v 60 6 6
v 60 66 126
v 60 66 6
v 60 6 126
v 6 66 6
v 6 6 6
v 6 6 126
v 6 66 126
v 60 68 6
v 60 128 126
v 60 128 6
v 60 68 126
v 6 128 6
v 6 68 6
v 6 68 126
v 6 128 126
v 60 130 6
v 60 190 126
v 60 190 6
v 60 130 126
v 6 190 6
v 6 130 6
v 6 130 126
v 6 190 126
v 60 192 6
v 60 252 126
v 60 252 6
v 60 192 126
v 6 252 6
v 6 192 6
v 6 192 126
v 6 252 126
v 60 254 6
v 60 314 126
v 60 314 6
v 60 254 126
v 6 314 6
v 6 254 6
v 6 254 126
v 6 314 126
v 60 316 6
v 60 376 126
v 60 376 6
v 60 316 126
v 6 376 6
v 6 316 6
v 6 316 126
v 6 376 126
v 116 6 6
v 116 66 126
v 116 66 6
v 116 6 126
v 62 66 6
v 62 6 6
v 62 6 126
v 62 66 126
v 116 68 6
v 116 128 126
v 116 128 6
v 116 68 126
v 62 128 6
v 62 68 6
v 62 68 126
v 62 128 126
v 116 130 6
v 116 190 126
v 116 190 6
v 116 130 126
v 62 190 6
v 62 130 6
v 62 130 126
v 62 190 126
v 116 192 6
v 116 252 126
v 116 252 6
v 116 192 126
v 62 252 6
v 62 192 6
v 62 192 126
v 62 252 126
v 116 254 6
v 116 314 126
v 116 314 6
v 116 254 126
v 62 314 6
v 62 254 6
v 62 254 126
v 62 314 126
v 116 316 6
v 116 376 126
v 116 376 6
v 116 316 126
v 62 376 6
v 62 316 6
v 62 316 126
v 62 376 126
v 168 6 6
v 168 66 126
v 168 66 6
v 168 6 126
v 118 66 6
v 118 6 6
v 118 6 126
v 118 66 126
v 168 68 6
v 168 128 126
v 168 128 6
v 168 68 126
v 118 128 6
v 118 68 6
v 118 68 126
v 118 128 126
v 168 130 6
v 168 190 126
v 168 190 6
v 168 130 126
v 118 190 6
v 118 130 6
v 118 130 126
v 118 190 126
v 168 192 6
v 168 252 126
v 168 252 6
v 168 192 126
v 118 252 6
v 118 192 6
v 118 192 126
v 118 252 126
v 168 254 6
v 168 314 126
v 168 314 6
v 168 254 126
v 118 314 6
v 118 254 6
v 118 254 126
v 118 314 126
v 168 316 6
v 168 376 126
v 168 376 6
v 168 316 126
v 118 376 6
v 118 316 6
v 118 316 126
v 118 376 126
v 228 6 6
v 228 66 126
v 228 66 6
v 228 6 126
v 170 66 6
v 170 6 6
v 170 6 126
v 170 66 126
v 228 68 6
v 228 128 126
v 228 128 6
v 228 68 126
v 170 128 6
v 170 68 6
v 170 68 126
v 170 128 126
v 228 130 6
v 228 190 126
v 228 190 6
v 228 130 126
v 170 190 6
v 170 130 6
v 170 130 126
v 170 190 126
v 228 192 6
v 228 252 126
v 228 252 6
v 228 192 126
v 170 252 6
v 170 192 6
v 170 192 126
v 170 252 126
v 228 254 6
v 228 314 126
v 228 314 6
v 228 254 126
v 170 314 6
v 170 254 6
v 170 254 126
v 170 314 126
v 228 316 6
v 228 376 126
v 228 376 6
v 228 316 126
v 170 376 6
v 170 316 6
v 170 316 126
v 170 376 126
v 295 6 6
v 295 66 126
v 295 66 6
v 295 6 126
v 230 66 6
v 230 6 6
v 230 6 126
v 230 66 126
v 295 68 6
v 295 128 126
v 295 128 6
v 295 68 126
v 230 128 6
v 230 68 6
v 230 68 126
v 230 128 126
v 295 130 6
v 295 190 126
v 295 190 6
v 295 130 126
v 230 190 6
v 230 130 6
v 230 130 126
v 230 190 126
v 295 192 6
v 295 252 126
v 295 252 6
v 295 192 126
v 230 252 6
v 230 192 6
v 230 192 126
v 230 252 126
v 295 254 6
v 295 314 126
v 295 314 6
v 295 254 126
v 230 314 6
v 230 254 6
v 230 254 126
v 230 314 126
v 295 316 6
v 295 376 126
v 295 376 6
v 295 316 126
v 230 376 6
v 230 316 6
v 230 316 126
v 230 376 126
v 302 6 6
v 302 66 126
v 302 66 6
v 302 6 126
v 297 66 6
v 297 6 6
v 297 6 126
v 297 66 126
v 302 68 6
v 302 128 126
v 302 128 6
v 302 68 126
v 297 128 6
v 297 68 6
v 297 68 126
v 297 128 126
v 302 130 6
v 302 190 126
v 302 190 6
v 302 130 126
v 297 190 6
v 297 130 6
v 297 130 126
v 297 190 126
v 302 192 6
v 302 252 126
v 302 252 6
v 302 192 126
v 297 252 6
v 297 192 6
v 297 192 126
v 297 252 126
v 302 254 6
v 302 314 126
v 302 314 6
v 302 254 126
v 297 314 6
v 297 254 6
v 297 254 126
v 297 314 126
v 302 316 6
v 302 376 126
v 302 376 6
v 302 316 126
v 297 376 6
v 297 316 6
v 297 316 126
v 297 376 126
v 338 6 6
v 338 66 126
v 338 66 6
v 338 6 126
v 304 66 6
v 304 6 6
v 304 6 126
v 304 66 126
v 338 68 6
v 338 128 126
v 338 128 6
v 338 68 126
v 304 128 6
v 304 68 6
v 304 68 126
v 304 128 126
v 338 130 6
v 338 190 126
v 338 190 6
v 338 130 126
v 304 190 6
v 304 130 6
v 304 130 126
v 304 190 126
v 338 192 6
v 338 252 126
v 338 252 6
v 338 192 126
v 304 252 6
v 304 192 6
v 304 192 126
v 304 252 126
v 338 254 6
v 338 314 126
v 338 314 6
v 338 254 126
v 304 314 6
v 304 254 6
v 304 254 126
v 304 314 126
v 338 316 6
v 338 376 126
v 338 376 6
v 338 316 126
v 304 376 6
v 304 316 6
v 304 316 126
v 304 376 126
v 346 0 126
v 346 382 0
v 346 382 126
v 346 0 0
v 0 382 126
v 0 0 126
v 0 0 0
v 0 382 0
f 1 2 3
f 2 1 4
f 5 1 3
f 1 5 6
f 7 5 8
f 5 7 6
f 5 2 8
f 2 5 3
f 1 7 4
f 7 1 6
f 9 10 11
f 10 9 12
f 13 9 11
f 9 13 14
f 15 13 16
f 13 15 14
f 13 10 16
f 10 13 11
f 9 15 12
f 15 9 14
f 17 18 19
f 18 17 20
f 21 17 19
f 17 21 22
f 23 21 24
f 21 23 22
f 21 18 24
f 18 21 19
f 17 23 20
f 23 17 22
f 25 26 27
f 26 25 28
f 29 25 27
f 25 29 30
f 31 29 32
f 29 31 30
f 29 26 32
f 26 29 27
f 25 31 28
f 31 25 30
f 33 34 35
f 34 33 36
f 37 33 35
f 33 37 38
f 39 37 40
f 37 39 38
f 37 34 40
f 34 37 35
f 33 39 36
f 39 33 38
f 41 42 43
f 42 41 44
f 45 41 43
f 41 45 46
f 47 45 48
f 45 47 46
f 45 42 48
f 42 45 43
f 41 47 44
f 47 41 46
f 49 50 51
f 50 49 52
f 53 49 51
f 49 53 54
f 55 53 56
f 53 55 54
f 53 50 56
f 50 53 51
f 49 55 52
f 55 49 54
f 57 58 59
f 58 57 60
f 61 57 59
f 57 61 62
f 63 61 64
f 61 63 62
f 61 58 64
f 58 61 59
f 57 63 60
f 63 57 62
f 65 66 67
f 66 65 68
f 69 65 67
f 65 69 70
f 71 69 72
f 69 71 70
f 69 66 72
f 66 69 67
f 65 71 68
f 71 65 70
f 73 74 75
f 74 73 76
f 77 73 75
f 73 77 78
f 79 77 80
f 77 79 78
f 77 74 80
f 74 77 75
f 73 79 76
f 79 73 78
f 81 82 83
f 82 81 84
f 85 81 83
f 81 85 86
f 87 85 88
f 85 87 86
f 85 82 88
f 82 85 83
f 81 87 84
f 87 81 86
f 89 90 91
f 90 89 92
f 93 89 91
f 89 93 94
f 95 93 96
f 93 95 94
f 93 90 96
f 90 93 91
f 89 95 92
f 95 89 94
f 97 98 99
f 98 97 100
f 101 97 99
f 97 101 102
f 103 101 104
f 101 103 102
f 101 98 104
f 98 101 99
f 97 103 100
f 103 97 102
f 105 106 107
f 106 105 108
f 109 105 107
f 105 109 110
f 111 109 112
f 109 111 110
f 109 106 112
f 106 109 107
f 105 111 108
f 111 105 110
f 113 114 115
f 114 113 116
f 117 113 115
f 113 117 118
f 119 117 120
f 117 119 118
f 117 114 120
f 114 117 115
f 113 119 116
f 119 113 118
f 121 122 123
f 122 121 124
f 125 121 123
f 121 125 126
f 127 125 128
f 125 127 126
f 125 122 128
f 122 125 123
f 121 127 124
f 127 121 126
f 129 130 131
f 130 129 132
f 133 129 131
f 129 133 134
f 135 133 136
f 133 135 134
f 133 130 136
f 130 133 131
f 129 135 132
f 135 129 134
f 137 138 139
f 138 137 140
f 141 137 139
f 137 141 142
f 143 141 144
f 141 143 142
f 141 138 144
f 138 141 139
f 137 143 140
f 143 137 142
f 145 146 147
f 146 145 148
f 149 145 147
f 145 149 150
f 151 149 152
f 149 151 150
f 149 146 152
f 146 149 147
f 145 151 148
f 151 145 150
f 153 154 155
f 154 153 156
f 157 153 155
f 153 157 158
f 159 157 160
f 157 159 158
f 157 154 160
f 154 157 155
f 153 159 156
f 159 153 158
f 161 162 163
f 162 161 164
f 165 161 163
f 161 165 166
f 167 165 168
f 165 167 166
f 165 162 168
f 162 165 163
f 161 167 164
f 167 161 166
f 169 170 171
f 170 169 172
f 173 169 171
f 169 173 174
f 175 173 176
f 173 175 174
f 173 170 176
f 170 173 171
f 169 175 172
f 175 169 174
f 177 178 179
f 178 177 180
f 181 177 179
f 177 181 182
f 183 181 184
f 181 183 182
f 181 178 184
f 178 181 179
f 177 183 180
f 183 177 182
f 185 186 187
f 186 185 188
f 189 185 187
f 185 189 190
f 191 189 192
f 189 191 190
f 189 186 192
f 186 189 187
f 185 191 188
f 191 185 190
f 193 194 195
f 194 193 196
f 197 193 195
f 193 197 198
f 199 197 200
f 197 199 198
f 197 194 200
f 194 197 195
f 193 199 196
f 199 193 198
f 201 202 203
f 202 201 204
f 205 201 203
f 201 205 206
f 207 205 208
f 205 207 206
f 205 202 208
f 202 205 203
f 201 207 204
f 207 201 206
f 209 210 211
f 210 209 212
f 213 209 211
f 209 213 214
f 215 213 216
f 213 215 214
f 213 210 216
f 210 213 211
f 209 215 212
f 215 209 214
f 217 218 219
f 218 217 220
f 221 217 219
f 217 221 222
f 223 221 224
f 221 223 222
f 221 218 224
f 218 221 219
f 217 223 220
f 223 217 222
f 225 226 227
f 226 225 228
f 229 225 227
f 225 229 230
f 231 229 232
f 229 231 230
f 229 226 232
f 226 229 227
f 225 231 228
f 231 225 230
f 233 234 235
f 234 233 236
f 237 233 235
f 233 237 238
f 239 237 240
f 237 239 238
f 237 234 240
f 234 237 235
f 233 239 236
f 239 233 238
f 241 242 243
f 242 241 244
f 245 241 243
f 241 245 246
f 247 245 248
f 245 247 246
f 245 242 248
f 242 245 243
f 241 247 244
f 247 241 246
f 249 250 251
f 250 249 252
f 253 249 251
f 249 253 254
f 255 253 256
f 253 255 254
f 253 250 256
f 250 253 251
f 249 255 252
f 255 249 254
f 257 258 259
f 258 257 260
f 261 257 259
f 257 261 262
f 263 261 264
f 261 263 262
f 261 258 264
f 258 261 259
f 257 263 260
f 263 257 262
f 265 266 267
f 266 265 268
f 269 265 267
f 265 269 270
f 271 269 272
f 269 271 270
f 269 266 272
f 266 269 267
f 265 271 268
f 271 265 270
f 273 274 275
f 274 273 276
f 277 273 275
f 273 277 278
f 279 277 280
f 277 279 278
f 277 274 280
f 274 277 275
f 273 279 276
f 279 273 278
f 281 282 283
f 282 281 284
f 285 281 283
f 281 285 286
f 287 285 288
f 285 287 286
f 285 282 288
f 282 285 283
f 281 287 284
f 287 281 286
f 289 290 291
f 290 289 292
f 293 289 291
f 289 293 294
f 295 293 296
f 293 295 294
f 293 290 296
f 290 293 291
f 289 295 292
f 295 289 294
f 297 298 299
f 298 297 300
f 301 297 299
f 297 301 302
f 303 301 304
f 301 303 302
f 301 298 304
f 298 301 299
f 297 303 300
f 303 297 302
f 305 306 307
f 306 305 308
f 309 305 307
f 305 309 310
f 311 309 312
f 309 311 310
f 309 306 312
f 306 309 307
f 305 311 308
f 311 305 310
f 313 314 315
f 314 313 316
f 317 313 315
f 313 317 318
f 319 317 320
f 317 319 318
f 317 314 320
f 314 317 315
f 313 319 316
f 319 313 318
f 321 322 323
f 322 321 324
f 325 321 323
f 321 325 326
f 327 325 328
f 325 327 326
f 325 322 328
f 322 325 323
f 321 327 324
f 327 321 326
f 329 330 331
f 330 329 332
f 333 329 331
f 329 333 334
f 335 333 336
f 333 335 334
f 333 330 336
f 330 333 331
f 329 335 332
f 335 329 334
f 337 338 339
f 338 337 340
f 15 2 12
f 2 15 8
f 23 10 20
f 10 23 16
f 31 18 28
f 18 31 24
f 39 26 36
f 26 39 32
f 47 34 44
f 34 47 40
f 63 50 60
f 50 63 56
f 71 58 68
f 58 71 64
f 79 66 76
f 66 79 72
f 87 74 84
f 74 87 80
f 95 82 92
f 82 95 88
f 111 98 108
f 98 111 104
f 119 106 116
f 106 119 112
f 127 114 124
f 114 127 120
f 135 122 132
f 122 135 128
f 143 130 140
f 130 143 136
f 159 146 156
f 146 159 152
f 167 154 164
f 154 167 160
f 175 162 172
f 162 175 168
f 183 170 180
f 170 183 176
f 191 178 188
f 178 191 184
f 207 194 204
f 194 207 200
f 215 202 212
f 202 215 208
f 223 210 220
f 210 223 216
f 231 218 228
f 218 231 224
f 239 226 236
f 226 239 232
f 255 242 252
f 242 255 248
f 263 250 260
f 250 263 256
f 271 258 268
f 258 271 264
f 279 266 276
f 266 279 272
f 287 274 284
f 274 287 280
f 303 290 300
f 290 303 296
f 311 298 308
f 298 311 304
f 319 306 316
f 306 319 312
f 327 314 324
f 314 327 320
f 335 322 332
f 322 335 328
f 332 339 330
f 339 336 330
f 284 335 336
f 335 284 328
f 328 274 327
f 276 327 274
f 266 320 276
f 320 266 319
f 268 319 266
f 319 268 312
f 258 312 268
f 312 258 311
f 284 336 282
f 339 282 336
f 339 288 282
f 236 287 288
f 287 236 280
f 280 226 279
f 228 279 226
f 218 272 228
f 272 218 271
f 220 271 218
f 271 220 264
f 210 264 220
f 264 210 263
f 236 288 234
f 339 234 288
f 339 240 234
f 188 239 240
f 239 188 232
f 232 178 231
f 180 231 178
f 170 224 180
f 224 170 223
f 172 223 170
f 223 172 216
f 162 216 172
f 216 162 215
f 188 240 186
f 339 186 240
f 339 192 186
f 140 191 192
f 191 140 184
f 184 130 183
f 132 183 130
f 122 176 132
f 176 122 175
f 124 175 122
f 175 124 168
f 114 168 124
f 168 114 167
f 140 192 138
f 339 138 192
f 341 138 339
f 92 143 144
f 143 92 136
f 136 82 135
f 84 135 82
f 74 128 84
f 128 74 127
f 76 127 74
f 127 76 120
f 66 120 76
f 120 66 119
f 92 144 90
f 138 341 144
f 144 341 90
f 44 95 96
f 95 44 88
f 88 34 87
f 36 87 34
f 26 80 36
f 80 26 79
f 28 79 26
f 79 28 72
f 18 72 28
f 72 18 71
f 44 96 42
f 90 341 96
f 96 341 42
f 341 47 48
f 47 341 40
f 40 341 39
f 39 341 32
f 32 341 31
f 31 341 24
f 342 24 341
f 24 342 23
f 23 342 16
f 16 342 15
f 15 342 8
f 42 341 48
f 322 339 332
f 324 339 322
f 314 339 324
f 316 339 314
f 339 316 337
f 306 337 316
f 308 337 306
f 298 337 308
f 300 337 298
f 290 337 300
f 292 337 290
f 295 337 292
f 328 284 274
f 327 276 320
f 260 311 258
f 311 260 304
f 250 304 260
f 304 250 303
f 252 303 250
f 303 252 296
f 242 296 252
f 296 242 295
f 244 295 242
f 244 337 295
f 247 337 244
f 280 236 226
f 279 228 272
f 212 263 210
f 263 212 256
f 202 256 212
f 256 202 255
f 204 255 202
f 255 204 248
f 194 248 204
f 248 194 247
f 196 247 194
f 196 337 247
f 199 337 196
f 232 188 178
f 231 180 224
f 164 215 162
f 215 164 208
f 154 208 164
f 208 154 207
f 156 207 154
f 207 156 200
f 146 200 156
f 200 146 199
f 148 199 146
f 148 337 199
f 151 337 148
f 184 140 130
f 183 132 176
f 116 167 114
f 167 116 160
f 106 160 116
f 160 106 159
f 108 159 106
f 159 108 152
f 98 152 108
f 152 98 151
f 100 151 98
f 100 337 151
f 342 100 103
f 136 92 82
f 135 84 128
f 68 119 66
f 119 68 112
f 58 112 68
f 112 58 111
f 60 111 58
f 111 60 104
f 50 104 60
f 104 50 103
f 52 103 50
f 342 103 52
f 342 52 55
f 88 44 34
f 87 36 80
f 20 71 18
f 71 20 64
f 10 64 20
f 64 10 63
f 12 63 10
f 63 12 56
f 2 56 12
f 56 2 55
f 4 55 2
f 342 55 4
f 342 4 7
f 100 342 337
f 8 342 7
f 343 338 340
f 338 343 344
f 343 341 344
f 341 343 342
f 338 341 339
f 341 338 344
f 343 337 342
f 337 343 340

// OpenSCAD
/* [Box dimensions] */
// Width of the box (X)
width = 60;
// Height of the box (Z)
height = 120;
// Number of rows (Y)
nbRows = 6;

/* [Holes dimensions] */
// Lengths of the holes
lengths = [0,54,54,50,0,58,0,65,0,5,34];

/* [Thickness] */
// External thickness
extTk = 6;
// Internal thickness
intTk = 2;

 // recursion - find the sum of the values in a vector (array) by calling itself
 // from the start (or s'th element) to the i'th element
function sumv(v,i,s=0) = (i<0 ? 0 :(i==s ? v[i] : v[i] + sumv(v,i-1,s)));

// recursion - find the count of the values different of zero in a vector (array) from start (s) to the i'th element.
function lenWZ(v,i,s=0) =   (i<0 || s<0 || s>i) ? 0 : (((v[i]==0) ? 0 : 1) + ((i==s) ? 0 : lenWZ(v,i-1,s)));

difference()
{
    // Box
    color("red")
    cube([sumv(lengths,len(lengths)-1)+(lenWZ(lengths,len(lengths))-1)*intTk+2*extTk,width*nbRows+(nbRows-1)*intTk+2*extTk,height+extTk]);
    
    // Holes
    for(vX = [0 : len(lengths)-1], vY=[0:nbRows-1])
        if (lengths[vX]!=0)
            translate([sumv(lengths,vX-1)+(lenWZ(lengths,vX)-1)*intTk+extTk,extTk+vY*(intTk+width),extTk])
            cube([lengths[vX],width,height+1]);
}
